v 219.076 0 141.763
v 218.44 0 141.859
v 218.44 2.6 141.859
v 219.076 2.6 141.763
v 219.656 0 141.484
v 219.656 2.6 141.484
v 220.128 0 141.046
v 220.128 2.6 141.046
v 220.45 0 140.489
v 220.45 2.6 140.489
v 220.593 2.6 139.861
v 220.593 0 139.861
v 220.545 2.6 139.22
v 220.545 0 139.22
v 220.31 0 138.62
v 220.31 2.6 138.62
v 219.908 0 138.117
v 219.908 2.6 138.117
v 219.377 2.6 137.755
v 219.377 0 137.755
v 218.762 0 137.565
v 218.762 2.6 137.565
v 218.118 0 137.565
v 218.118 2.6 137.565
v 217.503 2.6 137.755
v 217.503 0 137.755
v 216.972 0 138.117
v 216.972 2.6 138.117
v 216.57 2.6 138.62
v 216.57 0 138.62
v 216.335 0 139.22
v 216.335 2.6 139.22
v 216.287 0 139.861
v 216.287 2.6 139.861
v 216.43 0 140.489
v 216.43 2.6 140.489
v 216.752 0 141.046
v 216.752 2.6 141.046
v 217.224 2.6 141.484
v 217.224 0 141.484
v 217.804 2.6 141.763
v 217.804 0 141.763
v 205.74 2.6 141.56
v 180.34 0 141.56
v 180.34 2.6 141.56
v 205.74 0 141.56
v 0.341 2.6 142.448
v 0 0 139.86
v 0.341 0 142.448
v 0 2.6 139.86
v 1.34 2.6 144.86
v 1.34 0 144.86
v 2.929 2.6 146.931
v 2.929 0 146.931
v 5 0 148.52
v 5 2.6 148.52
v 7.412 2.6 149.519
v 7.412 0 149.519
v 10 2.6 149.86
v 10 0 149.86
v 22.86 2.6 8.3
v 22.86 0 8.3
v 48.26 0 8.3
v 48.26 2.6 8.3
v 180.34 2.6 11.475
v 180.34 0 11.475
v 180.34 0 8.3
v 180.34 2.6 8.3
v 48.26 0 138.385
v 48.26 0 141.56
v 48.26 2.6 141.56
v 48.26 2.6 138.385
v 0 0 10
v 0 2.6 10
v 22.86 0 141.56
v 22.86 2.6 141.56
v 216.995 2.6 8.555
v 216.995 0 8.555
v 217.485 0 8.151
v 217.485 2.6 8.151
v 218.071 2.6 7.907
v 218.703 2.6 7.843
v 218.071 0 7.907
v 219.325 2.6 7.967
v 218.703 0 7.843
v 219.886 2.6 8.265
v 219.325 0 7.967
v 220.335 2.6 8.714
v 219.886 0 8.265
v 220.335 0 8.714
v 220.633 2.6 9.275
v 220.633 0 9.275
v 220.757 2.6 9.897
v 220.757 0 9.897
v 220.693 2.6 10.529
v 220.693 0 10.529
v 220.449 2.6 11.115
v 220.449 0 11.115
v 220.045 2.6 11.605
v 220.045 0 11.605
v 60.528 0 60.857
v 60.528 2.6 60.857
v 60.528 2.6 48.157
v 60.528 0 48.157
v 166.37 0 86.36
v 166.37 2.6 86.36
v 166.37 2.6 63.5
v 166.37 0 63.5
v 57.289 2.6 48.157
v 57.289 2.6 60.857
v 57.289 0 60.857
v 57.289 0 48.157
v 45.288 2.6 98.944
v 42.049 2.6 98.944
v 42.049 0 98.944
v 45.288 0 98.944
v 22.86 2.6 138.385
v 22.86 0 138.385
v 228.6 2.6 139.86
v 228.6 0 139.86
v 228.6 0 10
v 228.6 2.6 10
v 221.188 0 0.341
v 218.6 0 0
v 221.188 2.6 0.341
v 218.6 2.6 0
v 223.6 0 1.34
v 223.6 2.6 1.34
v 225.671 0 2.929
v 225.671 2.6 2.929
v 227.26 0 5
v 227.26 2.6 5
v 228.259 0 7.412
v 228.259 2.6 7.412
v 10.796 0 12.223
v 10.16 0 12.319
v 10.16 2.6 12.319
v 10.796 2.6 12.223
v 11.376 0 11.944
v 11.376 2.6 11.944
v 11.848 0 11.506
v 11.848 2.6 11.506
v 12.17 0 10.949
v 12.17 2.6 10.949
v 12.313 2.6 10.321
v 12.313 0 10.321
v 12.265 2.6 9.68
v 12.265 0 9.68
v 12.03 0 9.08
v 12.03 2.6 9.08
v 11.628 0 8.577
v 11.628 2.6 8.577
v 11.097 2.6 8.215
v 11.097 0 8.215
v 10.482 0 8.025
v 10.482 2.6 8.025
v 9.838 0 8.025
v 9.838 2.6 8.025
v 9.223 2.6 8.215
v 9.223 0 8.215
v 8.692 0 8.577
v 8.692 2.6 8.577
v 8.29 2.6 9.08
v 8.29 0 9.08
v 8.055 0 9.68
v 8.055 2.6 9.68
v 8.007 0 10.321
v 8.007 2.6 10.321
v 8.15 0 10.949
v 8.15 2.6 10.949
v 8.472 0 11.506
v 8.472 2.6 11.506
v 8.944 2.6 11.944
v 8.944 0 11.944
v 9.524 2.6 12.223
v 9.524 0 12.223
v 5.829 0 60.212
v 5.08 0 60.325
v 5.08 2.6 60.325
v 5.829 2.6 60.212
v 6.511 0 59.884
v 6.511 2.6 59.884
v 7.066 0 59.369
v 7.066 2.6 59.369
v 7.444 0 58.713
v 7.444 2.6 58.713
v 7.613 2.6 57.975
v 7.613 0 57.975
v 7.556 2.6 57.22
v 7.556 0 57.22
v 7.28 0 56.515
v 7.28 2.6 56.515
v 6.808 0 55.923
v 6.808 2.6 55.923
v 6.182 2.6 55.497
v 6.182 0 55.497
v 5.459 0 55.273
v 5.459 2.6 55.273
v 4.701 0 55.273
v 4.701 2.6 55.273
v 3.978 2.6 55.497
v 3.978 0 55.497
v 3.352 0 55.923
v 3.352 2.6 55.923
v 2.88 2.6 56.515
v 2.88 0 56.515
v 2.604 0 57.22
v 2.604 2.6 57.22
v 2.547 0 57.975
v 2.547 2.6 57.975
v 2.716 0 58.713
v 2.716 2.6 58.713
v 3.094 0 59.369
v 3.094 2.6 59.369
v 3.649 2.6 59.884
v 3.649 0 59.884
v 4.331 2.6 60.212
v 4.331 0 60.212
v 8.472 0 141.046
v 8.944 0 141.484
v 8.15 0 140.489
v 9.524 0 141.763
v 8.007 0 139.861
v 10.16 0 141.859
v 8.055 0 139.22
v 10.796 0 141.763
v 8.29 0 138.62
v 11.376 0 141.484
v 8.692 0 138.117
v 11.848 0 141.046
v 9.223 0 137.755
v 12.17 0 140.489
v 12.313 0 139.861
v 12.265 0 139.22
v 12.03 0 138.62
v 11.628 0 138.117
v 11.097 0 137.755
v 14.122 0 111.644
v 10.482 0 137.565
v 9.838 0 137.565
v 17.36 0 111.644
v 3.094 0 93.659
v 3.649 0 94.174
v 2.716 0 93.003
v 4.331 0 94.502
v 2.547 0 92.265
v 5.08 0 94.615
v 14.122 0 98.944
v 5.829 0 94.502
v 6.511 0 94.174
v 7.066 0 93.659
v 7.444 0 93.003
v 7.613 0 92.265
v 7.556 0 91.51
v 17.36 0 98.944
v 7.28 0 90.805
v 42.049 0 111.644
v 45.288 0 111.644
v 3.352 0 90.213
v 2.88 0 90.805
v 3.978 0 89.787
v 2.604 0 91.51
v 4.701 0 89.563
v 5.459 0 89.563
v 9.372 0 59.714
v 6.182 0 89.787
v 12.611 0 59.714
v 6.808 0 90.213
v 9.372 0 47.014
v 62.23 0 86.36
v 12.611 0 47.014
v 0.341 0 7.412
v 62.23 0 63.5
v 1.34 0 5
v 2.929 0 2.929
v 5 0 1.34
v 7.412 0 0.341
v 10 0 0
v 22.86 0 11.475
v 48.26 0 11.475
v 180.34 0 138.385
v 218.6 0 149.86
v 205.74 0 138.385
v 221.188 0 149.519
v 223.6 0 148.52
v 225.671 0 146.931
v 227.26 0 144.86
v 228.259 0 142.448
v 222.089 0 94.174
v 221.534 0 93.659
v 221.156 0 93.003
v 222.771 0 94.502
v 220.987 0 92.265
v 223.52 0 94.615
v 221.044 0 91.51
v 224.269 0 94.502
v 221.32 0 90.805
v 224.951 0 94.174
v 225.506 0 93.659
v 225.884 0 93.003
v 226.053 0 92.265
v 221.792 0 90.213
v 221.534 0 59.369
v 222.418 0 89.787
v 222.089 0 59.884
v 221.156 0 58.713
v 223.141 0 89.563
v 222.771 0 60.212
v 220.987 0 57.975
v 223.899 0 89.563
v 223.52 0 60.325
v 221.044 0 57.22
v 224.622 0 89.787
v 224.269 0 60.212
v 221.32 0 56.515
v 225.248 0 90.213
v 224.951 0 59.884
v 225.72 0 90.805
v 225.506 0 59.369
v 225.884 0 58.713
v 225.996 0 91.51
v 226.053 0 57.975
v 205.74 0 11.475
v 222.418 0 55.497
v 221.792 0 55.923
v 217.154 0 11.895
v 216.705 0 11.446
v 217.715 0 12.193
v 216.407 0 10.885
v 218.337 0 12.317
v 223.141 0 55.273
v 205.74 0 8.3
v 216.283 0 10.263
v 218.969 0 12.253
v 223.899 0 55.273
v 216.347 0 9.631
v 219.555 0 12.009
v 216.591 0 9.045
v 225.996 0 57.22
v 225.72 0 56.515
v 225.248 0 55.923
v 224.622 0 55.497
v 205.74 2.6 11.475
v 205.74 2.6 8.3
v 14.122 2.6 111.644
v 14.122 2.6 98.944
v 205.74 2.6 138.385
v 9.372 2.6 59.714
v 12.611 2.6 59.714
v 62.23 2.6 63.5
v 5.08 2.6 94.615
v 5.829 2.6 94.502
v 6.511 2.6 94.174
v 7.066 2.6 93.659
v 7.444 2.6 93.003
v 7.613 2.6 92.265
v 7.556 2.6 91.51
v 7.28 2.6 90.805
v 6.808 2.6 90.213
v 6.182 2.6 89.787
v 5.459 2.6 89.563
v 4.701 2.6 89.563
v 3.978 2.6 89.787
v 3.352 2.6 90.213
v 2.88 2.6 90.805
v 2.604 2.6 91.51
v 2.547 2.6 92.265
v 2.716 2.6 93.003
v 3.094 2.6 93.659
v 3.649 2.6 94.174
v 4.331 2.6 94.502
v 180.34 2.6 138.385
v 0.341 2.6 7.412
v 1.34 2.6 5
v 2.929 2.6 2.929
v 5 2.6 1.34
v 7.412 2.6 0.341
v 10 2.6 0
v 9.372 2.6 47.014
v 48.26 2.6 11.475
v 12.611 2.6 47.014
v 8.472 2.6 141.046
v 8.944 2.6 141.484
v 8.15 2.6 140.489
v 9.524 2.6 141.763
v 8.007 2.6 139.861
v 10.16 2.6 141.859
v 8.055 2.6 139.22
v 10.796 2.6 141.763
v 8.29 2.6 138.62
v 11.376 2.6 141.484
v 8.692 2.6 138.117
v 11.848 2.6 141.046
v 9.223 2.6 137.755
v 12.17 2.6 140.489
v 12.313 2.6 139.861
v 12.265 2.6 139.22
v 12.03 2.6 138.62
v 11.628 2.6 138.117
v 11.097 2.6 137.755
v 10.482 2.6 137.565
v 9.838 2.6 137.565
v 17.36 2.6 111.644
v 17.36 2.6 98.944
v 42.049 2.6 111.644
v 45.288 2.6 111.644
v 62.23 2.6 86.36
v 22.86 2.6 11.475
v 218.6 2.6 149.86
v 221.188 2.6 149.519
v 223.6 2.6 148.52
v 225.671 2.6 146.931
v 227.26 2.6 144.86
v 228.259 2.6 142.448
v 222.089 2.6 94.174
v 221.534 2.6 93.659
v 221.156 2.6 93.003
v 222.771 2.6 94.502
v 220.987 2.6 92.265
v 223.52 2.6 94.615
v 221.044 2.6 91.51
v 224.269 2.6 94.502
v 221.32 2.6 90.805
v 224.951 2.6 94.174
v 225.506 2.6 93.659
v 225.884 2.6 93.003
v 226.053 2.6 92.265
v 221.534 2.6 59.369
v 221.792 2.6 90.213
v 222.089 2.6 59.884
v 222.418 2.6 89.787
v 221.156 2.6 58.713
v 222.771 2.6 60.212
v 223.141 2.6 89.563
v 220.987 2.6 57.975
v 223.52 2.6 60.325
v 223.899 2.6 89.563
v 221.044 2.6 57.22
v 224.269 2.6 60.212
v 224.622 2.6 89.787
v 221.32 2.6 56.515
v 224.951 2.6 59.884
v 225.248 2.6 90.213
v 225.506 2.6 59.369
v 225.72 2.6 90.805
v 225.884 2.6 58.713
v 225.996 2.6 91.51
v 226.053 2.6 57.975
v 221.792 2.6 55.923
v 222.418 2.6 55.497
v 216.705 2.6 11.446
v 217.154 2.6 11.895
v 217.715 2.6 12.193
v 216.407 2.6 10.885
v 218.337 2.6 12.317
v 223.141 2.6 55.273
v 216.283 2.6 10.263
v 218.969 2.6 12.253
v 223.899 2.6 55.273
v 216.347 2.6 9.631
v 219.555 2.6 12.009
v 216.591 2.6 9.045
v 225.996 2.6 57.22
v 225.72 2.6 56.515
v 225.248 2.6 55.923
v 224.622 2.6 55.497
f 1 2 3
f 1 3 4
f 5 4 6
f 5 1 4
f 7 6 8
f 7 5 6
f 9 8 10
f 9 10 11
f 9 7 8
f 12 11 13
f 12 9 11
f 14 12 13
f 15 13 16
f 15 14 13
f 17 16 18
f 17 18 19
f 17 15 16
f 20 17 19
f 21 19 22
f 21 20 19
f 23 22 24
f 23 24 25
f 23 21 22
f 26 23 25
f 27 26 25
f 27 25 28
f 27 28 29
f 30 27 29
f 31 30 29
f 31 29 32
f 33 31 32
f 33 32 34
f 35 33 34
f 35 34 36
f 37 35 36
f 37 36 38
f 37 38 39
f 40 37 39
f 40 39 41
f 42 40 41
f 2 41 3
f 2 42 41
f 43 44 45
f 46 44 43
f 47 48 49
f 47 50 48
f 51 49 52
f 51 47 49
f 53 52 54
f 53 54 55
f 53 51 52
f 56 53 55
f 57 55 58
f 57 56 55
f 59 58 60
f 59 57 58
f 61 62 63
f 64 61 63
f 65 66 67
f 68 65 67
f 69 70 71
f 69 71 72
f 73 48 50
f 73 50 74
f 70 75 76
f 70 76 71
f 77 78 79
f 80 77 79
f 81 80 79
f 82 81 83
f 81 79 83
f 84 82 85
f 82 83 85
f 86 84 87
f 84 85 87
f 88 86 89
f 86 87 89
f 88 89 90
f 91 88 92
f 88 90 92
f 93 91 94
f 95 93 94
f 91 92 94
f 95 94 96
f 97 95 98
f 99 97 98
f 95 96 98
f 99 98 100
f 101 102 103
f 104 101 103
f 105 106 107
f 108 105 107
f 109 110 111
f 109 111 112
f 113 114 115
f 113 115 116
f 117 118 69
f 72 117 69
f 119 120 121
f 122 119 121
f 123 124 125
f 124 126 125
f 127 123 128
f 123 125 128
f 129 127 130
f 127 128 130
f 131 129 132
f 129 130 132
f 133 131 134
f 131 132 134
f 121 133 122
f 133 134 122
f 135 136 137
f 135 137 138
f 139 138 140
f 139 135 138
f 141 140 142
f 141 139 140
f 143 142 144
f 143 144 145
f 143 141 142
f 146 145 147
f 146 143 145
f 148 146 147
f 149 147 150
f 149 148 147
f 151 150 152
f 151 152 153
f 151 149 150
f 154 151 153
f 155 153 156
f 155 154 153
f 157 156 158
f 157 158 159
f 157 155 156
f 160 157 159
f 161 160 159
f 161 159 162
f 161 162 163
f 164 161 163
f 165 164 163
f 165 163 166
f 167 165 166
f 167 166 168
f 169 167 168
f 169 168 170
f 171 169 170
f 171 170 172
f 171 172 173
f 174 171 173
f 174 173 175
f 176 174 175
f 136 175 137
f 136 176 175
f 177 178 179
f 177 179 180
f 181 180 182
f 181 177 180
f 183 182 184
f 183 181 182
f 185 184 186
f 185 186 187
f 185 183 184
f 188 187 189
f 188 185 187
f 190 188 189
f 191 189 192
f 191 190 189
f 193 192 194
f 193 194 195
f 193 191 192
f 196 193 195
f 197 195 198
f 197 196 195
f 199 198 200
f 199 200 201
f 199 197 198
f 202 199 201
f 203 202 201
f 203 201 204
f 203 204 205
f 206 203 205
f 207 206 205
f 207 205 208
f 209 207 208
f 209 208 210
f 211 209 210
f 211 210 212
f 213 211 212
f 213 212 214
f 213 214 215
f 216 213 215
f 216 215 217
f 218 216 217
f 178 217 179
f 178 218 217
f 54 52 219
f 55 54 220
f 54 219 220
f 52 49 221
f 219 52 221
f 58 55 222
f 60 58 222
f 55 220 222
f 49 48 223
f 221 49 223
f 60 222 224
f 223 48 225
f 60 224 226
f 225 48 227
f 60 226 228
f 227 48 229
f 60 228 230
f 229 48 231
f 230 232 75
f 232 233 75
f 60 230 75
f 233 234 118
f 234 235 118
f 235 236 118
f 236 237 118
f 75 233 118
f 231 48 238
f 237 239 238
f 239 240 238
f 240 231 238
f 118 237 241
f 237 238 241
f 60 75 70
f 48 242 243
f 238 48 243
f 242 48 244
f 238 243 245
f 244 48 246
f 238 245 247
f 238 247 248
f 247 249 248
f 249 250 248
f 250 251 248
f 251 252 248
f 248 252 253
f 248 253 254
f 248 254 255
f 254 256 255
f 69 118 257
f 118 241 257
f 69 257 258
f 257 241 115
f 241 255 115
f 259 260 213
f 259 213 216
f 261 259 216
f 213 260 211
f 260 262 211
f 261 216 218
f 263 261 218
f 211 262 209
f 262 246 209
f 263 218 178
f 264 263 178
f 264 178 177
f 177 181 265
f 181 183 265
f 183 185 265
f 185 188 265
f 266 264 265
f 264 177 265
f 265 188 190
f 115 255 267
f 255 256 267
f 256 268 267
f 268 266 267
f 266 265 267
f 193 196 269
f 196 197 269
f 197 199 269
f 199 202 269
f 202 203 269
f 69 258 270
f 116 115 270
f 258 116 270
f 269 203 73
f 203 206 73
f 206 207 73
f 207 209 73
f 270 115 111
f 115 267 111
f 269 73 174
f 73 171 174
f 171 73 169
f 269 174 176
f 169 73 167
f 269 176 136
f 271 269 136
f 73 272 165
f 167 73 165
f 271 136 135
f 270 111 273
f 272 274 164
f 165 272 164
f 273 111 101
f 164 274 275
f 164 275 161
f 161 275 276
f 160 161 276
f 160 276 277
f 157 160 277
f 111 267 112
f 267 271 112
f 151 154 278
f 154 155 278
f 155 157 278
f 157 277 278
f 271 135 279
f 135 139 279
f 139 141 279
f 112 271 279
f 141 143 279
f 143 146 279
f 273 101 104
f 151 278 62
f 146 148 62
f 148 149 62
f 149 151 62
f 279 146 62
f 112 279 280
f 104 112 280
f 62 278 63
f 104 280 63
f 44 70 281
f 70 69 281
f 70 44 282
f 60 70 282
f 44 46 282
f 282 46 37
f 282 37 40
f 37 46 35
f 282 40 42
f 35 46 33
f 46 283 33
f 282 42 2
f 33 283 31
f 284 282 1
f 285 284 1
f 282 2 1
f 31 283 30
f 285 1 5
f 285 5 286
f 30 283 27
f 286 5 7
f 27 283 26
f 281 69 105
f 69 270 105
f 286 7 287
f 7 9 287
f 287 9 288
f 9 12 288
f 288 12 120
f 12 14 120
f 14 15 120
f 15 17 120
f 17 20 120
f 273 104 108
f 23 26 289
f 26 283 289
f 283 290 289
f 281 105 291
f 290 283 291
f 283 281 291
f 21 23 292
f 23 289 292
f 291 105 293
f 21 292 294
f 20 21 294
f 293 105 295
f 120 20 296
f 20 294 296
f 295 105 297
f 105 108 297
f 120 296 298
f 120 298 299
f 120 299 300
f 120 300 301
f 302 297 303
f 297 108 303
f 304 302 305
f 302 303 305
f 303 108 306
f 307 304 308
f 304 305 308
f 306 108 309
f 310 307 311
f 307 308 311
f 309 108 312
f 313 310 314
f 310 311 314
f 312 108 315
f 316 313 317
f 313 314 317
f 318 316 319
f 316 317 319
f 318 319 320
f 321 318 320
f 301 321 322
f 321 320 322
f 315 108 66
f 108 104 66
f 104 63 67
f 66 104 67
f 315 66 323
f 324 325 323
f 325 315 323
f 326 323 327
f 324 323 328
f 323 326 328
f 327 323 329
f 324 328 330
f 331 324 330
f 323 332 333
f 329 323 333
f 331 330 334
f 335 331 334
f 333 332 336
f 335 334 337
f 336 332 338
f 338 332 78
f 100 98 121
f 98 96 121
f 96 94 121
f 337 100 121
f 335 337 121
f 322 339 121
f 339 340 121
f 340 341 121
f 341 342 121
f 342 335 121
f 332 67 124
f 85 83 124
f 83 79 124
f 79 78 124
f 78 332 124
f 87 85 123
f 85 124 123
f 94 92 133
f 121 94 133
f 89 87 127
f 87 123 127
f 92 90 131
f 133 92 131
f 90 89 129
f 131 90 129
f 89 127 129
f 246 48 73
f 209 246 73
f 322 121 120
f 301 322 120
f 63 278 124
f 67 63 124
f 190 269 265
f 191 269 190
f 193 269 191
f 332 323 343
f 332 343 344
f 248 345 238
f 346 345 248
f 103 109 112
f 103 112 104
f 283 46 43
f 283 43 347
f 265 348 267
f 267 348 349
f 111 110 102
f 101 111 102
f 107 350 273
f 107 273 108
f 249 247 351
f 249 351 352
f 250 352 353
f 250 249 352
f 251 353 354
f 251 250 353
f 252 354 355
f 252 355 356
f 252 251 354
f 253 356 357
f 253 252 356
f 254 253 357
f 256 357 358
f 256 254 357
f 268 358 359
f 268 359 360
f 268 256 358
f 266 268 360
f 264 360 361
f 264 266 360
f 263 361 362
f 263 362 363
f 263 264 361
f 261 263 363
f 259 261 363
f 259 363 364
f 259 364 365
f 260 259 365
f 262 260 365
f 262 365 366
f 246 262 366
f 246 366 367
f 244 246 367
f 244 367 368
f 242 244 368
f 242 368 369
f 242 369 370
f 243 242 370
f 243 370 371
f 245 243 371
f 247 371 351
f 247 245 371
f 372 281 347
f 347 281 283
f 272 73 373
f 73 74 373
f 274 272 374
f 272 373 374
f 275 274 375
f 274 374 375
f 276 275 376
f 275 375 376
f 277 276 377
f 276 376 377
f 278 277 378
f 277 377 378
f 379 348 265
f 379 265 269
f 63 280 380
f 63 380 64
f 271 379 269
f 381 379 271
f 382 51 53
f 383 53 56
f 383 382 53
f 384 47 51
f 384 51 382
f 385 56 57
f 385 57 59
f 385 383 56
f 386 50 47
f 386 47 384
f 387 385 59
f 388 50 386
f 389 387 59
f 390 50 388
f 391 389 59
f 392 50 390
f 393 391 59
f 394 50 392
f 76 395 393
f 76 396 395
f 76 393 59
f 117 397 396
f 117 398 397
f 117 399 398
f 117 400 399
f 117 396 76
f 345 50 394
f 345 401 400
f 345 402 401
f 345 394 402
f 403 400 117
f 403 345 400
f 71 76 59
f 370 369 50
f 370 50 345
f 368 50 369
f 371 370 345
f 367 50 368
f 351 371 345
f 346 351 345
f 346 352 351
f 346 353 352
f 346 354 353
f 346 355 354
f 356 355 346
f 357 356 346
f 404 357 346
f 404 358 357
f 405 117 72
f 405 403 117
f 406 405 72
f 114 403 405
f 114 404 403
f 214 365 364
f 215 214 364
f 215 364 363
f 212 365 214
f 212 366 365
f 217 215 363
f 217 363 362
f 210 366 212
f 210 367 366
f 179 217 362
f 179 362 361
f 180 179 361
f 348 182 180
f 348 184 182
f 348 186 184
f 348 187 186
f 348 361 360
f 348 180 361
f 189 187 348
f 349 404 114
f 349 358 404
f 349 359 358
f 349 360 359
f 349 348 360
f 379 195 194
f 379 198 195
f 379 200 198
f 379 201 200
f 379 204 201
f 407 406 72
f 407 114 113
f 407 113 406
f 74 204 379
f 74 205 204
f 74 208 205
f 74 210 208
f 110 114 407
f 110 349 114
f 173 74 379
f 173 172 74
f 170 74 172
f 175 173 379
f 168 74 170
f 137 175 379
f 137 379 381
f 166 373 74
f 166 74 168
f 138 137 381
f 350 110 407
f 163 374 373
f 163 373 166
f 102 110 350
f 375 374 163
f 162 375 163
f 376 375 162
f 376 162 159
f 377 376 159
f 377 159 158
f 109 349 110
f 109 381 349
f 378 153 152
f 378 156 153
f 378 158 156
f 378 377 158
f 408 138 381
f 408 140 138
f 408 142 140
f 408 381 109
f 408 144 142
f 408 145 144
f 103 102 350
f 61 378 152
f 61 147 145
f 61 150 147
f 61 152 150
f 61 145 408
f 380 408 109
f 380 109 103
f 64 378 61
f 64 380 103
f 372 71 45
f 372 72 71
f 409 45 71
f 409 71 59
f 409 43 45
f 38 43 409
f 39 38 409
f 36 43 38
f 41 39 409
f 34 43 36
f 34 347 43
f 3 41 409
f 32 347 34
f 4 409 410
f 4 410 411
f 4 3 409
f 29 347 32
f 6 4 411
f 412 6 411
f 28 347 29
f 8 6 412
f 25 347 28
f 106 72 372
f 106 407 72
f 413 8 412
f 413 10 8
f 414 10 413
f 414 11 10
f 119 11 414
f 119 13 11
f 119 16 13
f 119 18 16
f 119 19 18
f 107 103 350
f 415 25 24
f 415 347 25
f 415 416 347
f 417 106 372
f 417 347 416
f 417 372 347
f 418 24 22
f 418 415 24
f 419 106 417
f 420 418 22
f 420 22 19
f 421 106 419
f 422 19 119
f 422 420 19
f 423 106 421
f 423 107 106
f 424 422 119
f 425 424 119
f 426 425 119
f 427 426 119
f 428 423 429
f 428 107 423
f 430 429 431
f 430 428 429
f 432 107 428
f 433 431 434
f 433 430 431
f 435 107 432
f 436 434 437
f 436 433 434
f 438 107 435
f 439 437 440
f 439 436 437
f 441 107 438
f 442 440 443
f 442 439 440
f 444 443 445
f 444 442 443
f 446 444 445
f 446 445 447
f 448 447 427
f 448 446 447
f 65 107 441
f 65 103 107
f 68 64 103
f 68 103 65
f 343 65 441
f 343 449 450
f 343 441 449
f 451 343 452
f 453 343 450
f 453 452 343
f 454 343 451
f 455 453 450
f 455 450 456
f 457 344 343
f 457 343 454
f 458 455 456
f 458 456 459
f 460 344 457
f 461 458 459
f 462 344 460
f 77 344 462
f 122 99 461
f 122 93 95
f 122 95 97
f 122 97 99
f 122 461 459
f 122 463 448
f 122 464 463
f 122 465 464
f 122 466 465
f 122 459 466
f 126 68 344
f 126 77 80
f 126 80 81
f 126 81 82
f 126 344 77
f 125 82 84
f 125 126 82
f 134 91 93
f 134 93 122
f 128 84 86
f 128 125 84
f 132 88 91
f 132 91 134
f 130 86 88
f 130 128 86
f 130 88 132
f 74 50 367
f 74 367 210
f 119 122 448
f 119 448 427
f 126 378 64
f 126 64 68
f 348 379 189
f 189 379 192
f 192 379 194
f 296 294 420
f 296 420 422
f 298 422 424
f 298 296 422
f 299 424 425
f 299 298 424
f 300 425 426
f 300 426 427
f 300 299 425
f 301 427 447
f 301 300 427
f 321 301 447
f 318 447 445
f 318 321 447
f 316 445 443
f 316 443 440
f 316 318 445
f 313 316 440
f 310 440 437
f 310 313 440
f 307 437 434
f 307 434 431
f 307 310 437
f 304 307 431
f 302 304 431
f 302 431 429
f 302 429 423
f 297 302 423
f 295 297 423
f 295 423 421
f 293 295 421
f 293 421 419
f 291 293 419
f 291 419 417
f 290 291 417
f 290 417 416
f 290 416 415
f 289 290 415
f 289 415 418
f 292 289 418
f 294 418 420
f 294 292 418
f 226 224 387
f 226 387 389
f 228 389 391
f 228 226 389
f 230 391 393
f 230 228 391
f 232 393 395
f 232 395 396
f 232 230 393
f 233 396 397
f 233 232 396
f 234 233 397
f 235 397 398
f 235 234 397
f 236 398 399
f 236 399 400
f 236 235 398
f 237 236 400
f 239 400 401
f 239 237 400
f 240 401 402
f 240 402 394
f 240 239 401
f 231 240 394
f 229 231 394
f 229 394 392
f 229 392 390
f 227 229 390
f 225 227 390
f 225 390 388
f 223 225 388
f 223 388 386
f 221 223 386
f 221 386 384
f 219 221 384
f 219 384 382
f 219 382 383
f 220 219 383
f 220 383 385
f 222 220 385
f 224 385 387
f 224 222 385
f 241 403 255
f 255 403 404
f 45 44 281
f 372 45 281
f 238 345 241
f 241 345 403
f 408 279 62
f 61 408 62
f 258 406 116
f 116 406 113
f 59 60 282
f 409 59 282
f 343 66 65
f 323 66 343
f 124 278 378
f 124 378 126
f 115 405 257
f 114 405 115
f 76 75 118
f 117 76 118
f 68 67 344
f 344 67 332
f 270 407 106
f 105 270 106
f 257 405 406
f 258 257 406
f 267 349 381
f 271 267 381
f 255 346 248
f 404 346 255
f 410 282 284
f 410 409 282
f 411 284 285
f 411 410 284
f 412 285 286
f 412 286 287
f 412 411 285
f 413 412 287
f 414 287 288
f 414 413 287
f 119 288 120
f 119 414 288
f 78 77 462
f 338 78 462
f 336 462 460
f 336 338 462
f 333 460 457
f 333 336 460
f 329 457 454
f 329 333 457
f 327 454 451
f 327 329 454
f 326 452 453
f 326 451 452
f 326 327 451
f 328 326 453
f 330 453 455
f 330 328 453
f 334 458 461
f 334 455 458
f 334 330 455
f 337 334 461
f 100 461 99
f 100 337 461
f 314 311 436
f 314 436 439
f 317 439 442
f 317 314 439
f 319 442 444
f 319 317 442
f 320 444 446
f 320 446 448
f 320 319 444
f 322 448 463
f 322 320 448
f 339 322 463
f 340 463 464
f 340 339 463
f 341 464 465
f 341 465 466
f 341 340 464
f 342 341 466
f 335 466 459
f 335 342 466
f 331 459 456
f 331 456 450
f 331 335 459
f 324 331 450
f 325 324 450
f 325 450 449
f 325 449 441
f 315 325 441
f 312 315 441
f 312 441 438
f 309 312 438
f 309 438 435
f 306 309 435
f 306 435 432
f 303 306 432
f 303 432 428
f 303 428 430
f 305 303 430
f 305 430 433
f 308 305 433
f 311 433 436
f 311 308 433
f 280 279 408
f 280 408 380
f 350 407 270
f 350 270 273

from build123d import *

# Parameters (mm, degrees)
SKETCH1_W           = 228.6
SKETCH1_H           = 149.86
SKETCH1_R           = 2.54
SKETCH1_R_2         = 2.159
SKETCH1_W_2         = 25.4
SKETCH1_H_2         = 3.175
BOSS_EXTRUDE1_DEPTH = 2.6
FILLET1_R           = 10
SKETCH6_R           = 2.159
CUT_EXTRUDE6_DEPTH  = 2.6
SKETCH15_R          = 10
CUT_EXTRUDE14_DEPTH = 274.354604132
SKETCH25_W          = 104.14
SKETCH25_H          = 22.86
SKETCH25_W_2        = 3.2385
SKETCH25_H_2        = 12.7
CUT_EXTRUDE18_DEPTH = 10.16


with BuildPart() as part:
    # Sketch1 → Boss-Extrude1 (new body)
    with BuildSketch(Plane(origin=(0, 0, 0), x_dir=(1, 0, 0), z_dir=(0, 1, 0))):
        with Locations((114.3, -74.93)):
            Rectangle(SKETCH1_W, SKETCH1_H)
        with Locations(Location((5.08, -57.785, 0), (0, 0, 270))):
            Circle(SKETCH1_R, mode=Mode.SUBTRACT)
        with Locations(Location((5.08, -92.075, 0), (0, 0, 270))):
            Circle(SKETCH1_R, mode=Mode.SUBTRACT)
        with Locations(Location((223.52, -92.075, 0), (0, 0, 270))):
            Circle(SKETCH1_R, mode=Mode.SUBTRACT)
        with Locations(Location((223.52, -57.785, 0), (0, 0, 270))):
            Circle(SKETCH1_R, mode=Mode.SUBTRACT)
        with Locations(Location((218.44, -10.16, 0), (0, 0, 270))):
            Circle(SKETCH1_R_2, mode=Mode.SUBTRACT)
        with Locations(Location((10.16, -10.16, 0), (0, 0, 270))):
            Circle(SKETCH1_R_2, mode=Mode.SUBTRACT)
        with Locations(Location((218.44, -139.7, 0), (0, 0, 270))):
            Circle(SKETCH1_R_2, mode=Mode.SUBTRACT)
        with Locations(Location((10.16, -139.7, 0), (0, 0, 270))):
            Circle(SKETCH1_R_2, mode=Mode.SUBTRACT)
        with Locations((35.56, -9.887961988)):
            Rectangle(SKETCH1_W_2, SKETCH1_H_2, mode=Mode.SUBTRACT)
        with Locations((193.04, -9.887961988)):
            Rectangle(SKETCH1_W_2, SKETCH1_H_2, mode=Mode.SUBTRACT)
        with Locations((193.04, -139.972038012)):
            Rectangle(SKETCH1_W_2, SKETCH1_H_2, mode=Mode.SUBTRACT)
        with Locations((35.56, -139.972038012)):
            Rectangle(SKETCH1_W_2, SKETCH1_H_2, mode=Mode.SUBTRACT)
    extrude(amount=BOSS_EXTRUDE1_DEPTH)

    # Fillet1
    fillet1_edges = [part.edges().sort_by_distance(p)[0] for p in [
        (0, 1.3, 0),
        (228.6, 1.3, 0),
        (228.6, 1.3, 149.86),
        (0, 1.3, 149.86),
    ]]
    fillet(fillet1_edges, radius=FILLET1_R)

    # Sketch6 → Cut-Extrude6 (cut)
    with BuildSketch(Plane.XZ):
        with Locations((218.6, 10)):
            Circle(SKETCH6_R)
    extrude(amount=-CUT_EXTRUDE6_DEPTH, mode=Mode.SUBTRACT)

    # Sketch15 → Cut-Extrude14 (cut, through all)
    with BuildSketch(Plane.XZ):
        with Locations(Location((114.3, 74.93, 0), (0, 0, 270))):
            Circle(SKETCH15_R)
    extrude(amount=-CUT_EXTRUDE14_DEPTH, mode=Mode.SUBTRACT)

    # Sketch25 → Cut-Extrude18 (cut)
    with BuildSketch(Plane(origin=(0, 2.6, 0), x_dir=(1, 0, 0), z_dir=(0, 1, 0))):
        with Locations((114.3, -74.93)):
            Rectangle(SKETCH25_W, SKETCH25_H)
        with Locations((10.991446919, -53.364023976)):
            Rectangle(SKETCH25_W_2, SKETCH25_H_2)
        with Locations((58.908546919, -54.507023976)):
            Rectangle(SKETCH25_W_2, SKETCH25_H_2)
        with Locations((15.741246919, -105.294323976)):
            Rectangle(SKETCH25_W_2, SKETCH25_H_2)
        with Locations((43.668546919, -105.294323976)):
            Rectangle(SKETCH25_W_2, SKETCH25_H_2)
    extrude(amount=-CUT_EXTRUDE18_DEPTH, mode=Mode.SUBTRACT)


solid = part.part
